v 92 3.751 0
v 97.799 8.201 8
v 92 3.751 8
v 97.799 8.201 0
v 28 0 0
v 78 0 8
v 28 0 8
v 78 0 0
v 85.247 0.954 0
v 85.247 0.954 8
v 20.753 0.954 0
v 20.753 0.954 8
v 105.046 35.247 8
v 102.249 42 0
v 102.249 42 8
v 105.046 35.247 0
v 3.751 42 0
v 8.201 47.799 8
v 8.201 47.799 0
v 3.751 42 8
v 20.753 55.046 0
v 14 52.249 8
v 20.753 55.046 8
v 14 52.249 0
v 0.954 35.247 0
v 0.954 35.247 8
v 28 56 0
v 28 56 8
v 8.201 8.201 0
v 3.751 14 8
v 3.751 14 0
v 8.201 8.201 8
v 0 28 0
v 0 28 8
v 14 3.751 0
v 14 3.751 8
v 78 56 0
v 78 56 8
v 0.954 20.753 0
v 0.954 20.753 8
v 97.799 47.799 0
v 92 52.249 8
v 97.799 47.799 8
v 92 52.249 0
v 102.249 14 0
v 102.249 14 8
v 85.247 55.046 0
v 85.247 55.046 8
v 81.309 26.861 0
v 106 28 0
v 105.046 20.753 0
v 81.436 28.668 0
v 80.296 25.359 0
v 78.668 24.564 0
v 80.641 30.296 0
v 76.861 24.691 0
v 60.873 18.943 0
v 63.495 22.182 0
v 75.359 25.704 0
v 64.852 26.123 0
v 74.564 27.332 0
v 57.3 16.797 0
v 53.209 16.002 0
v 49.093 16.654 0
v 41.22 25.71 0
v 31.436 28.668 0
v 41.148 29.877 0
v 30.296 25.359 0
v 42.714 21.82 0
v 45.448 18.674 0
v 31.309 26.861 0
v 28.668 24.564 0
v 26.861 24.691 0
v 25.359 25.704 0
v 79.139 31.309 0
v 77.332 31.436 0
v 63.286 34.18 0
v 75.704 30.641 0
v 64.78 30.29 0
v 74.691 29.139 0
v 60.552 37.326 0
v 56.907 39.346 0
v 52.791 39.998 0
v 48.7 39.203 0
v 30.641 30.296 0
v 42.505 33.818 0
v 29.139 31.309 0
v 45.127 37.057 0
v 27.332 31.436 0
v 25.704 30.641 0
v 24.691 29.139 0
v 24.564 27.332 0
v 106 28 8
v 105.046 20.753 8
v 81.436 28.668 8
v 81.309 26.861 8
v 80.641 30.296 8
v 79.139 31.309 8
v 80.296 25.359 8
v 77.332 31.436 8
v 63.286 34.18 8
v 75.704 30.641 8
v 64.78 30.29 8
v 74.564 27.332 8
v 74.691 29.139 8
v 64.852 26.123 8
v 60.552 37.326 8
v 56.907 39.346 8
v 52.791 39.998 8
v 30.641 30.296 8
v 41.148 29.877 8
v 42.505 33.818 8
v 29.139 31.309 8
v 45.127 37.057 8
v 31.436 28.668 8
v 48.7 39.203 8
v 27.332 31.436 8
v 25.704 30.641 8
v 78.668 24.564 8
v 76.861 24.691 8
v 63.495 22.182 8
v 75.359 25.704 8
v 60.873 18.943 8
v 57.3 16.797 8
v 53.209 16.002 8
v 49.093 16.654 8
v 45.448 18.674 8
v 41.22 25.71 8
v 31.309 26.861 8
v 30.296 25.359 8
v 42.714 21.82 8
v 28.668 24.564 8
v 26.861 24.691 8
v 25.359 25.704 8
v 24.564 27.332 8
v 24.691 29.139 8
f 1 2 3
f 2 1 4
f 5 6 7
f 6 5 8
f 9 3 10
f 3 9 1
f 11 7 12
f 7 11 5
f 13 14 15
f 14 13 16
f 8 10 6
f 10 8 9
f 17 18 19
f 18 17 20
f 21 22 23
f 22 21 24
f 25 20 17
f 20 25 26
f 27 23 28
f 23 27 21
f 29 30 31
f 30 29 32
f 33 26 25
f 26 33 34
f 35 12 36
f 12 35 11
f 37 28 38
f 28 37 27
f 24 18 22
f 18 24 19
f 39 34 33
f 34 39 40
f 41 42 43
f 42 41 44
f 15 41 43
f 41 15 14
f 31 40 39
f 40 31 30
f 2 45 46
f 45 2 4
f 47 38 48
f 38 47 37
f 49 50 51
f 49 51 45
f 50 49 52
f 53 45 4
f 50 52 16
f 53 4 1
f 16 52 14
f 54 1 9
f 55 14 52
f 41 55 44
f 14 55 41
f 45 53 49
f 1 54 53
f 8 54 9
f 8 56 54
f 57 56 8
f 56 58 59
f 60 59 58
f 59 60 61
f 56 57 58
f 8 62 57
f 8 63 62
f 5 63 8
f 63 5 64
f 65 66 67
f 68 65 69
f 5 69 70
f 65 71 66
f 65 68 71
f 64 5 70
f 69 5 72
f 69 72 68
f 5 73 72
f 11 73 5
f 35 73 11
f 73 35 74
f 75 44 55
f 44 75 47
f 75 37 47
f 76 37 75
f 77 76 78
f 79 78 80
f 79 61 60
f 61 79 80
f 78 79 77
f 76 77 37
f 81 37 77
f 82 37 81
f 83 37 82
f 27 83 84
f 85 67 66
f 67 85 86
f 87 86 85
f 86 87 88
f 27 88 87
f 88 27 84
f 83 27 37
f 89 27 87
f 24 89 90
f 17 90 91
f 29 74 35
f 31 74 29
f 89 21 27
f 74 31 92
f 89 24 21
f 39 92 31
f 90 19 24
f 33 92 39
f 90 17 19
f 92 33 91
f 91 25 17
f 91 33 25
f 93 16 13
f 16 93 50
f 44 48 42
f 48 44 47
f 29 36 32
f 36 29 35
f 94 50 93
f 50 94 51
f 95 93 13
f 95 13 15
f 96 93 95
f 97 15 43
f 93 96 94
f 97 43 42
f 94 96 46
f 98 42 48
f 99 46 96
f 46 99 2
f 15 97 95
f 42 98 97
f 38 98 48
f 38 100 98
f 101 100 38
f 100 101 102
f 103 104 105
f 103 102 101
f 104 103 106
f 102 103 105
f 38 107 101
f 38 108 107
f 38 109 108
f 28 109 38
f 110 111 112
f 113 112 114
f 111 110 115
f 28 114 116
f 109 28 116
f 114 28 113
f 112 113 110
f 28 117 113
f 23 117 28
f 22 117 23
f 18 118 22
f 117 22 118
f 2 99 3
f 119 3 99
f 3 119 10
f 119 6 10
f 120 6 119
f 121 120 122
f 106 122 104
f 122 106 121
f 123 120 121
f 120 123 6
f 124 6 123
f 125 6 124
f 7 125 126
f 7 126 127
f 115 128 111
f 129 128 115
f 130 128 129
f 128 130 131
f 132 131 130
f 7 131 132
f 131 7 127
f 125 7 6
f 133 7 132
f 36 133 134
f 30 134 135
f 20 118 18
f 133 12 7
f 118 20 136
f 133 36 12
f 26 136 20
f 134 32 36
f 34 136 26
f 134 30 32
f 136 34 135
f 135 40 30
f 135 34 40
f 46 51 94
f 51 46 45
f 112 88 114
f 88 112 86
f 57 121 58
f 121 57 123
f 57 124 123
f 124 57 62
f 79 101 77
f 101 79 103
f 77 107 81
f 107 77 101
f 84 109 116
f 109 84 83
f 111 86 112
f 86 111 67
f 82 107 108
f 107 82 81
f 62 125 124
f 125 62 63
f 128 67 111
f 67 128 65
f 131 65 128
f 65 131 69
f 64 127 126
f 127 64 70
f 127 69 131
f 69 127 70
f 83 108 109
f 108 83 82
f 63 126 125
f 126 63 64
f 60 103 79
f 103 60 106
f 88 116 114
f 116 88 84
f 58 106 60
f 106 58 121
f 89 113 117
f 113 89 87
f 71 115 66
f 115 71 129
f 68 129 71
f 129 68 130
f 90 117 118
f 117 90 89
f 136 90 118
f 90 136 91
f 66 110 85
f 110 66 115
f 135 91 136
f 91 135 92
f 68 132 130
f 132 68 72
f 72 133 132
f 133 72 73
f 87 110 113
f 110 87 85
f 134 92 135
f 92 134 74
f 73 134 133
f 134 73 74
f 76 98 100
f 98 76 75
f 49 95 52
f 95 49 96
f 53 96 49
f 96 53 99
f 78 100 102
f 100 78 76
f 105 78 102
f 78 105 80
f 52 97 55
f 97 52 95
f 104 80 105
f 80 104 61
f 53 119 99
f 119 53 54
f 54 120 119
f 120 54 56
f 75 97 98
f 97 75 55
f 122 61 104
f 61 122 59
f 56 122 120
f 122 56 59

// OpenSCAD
$fn = 32;

// ----------------------------------------------------------------------
// Spacer plate: obround span 50, caps R28
// ----------------------------------------------------------------------

// --- parameters (mm) ---
bore_r = 12;              // centre bore radius
bolt_r = 3.5;             // bolt hole radius
plate_t = 8;              // plate thickness, Z (extrusion height)
span = 50;                // obround span
cap_r = 28;               // cap radius

profile = [[28, 56], [20.753, 55.046], [14, 52.249], [8.201, 47.799], [3.751, 42], [0.954, 35.247], [0, 28], [0.954, 20.753], [3.751, 14], [8.201, 8.201], [14, 3.751], [20.753, 0.954], [28, 0], [78, 0], [85.247, 0.954], [92, 3.751], [97.799, 8.201], [102.249, 14], [105.046, 20.753], [106, 28], [105.046, 35.247], [102.249, 42], [97.799, 47.799], [92, 52.249], [85.247, 55.046], [78, 56]];  // primary outline, 26 points, counter clockwise
void_1 = [[64.78, 30.29], [63.286, 34.18], [60.552, 37.326], [56.907, 39.346], [52.791, 39.998], [48.7, 39.203], [45.127, 37.057], [42.505, 33.818], [41.148, 29.877], [41.22, 25.71], [42.714, 21.82], [45.448, 18.674], [49.093, 16.654], [53.209, 16.002], [57.3, 16.797], [60.873, 18.943], [63.495, 22.182], [64.852, 26.123]];  // centre bore, 18 points
void_2 = [[31.436, 28.668], [30.641, 30.296], [29.139, 31.309], [27.332, 31.436], [25.704, 30.641], [24.691, 29.139], [24.564, 27.332], [25.359, 25.704], [26.861, 24.691], [28.668, 24.564], [30.296, 25.359], [31.309, 26.861]];  // end hole, 12 points
void_3 = [[81.436, 28.668], [80.641, 30.296], [79.139, 31.309], [77.332, 31.436], [75.704, 30.641], [74.691, 29.139], [74.564, 27.332], [75.359, 25.704], [76.861, 24.691], [78.668, 24.564], [80.296, 25.359], [81.309, 26.861]];  // end hole, 12 points

// --- the one profile operation ---
difference() {
  linear_extrude(height = plate_t) polygon(points = profile);
  translate([0, 0, -1])
    linear_extrude(height = plate_t + 2) polygon(points = void_1);
  translate([0, 0, -1])
    linear_extrude(height = plate_t + 2) polygon(points = void_2);
  translate([0, 0, -1])
    linear_extrude(height = plate_t + 2) polygon(points = void_3);
}
